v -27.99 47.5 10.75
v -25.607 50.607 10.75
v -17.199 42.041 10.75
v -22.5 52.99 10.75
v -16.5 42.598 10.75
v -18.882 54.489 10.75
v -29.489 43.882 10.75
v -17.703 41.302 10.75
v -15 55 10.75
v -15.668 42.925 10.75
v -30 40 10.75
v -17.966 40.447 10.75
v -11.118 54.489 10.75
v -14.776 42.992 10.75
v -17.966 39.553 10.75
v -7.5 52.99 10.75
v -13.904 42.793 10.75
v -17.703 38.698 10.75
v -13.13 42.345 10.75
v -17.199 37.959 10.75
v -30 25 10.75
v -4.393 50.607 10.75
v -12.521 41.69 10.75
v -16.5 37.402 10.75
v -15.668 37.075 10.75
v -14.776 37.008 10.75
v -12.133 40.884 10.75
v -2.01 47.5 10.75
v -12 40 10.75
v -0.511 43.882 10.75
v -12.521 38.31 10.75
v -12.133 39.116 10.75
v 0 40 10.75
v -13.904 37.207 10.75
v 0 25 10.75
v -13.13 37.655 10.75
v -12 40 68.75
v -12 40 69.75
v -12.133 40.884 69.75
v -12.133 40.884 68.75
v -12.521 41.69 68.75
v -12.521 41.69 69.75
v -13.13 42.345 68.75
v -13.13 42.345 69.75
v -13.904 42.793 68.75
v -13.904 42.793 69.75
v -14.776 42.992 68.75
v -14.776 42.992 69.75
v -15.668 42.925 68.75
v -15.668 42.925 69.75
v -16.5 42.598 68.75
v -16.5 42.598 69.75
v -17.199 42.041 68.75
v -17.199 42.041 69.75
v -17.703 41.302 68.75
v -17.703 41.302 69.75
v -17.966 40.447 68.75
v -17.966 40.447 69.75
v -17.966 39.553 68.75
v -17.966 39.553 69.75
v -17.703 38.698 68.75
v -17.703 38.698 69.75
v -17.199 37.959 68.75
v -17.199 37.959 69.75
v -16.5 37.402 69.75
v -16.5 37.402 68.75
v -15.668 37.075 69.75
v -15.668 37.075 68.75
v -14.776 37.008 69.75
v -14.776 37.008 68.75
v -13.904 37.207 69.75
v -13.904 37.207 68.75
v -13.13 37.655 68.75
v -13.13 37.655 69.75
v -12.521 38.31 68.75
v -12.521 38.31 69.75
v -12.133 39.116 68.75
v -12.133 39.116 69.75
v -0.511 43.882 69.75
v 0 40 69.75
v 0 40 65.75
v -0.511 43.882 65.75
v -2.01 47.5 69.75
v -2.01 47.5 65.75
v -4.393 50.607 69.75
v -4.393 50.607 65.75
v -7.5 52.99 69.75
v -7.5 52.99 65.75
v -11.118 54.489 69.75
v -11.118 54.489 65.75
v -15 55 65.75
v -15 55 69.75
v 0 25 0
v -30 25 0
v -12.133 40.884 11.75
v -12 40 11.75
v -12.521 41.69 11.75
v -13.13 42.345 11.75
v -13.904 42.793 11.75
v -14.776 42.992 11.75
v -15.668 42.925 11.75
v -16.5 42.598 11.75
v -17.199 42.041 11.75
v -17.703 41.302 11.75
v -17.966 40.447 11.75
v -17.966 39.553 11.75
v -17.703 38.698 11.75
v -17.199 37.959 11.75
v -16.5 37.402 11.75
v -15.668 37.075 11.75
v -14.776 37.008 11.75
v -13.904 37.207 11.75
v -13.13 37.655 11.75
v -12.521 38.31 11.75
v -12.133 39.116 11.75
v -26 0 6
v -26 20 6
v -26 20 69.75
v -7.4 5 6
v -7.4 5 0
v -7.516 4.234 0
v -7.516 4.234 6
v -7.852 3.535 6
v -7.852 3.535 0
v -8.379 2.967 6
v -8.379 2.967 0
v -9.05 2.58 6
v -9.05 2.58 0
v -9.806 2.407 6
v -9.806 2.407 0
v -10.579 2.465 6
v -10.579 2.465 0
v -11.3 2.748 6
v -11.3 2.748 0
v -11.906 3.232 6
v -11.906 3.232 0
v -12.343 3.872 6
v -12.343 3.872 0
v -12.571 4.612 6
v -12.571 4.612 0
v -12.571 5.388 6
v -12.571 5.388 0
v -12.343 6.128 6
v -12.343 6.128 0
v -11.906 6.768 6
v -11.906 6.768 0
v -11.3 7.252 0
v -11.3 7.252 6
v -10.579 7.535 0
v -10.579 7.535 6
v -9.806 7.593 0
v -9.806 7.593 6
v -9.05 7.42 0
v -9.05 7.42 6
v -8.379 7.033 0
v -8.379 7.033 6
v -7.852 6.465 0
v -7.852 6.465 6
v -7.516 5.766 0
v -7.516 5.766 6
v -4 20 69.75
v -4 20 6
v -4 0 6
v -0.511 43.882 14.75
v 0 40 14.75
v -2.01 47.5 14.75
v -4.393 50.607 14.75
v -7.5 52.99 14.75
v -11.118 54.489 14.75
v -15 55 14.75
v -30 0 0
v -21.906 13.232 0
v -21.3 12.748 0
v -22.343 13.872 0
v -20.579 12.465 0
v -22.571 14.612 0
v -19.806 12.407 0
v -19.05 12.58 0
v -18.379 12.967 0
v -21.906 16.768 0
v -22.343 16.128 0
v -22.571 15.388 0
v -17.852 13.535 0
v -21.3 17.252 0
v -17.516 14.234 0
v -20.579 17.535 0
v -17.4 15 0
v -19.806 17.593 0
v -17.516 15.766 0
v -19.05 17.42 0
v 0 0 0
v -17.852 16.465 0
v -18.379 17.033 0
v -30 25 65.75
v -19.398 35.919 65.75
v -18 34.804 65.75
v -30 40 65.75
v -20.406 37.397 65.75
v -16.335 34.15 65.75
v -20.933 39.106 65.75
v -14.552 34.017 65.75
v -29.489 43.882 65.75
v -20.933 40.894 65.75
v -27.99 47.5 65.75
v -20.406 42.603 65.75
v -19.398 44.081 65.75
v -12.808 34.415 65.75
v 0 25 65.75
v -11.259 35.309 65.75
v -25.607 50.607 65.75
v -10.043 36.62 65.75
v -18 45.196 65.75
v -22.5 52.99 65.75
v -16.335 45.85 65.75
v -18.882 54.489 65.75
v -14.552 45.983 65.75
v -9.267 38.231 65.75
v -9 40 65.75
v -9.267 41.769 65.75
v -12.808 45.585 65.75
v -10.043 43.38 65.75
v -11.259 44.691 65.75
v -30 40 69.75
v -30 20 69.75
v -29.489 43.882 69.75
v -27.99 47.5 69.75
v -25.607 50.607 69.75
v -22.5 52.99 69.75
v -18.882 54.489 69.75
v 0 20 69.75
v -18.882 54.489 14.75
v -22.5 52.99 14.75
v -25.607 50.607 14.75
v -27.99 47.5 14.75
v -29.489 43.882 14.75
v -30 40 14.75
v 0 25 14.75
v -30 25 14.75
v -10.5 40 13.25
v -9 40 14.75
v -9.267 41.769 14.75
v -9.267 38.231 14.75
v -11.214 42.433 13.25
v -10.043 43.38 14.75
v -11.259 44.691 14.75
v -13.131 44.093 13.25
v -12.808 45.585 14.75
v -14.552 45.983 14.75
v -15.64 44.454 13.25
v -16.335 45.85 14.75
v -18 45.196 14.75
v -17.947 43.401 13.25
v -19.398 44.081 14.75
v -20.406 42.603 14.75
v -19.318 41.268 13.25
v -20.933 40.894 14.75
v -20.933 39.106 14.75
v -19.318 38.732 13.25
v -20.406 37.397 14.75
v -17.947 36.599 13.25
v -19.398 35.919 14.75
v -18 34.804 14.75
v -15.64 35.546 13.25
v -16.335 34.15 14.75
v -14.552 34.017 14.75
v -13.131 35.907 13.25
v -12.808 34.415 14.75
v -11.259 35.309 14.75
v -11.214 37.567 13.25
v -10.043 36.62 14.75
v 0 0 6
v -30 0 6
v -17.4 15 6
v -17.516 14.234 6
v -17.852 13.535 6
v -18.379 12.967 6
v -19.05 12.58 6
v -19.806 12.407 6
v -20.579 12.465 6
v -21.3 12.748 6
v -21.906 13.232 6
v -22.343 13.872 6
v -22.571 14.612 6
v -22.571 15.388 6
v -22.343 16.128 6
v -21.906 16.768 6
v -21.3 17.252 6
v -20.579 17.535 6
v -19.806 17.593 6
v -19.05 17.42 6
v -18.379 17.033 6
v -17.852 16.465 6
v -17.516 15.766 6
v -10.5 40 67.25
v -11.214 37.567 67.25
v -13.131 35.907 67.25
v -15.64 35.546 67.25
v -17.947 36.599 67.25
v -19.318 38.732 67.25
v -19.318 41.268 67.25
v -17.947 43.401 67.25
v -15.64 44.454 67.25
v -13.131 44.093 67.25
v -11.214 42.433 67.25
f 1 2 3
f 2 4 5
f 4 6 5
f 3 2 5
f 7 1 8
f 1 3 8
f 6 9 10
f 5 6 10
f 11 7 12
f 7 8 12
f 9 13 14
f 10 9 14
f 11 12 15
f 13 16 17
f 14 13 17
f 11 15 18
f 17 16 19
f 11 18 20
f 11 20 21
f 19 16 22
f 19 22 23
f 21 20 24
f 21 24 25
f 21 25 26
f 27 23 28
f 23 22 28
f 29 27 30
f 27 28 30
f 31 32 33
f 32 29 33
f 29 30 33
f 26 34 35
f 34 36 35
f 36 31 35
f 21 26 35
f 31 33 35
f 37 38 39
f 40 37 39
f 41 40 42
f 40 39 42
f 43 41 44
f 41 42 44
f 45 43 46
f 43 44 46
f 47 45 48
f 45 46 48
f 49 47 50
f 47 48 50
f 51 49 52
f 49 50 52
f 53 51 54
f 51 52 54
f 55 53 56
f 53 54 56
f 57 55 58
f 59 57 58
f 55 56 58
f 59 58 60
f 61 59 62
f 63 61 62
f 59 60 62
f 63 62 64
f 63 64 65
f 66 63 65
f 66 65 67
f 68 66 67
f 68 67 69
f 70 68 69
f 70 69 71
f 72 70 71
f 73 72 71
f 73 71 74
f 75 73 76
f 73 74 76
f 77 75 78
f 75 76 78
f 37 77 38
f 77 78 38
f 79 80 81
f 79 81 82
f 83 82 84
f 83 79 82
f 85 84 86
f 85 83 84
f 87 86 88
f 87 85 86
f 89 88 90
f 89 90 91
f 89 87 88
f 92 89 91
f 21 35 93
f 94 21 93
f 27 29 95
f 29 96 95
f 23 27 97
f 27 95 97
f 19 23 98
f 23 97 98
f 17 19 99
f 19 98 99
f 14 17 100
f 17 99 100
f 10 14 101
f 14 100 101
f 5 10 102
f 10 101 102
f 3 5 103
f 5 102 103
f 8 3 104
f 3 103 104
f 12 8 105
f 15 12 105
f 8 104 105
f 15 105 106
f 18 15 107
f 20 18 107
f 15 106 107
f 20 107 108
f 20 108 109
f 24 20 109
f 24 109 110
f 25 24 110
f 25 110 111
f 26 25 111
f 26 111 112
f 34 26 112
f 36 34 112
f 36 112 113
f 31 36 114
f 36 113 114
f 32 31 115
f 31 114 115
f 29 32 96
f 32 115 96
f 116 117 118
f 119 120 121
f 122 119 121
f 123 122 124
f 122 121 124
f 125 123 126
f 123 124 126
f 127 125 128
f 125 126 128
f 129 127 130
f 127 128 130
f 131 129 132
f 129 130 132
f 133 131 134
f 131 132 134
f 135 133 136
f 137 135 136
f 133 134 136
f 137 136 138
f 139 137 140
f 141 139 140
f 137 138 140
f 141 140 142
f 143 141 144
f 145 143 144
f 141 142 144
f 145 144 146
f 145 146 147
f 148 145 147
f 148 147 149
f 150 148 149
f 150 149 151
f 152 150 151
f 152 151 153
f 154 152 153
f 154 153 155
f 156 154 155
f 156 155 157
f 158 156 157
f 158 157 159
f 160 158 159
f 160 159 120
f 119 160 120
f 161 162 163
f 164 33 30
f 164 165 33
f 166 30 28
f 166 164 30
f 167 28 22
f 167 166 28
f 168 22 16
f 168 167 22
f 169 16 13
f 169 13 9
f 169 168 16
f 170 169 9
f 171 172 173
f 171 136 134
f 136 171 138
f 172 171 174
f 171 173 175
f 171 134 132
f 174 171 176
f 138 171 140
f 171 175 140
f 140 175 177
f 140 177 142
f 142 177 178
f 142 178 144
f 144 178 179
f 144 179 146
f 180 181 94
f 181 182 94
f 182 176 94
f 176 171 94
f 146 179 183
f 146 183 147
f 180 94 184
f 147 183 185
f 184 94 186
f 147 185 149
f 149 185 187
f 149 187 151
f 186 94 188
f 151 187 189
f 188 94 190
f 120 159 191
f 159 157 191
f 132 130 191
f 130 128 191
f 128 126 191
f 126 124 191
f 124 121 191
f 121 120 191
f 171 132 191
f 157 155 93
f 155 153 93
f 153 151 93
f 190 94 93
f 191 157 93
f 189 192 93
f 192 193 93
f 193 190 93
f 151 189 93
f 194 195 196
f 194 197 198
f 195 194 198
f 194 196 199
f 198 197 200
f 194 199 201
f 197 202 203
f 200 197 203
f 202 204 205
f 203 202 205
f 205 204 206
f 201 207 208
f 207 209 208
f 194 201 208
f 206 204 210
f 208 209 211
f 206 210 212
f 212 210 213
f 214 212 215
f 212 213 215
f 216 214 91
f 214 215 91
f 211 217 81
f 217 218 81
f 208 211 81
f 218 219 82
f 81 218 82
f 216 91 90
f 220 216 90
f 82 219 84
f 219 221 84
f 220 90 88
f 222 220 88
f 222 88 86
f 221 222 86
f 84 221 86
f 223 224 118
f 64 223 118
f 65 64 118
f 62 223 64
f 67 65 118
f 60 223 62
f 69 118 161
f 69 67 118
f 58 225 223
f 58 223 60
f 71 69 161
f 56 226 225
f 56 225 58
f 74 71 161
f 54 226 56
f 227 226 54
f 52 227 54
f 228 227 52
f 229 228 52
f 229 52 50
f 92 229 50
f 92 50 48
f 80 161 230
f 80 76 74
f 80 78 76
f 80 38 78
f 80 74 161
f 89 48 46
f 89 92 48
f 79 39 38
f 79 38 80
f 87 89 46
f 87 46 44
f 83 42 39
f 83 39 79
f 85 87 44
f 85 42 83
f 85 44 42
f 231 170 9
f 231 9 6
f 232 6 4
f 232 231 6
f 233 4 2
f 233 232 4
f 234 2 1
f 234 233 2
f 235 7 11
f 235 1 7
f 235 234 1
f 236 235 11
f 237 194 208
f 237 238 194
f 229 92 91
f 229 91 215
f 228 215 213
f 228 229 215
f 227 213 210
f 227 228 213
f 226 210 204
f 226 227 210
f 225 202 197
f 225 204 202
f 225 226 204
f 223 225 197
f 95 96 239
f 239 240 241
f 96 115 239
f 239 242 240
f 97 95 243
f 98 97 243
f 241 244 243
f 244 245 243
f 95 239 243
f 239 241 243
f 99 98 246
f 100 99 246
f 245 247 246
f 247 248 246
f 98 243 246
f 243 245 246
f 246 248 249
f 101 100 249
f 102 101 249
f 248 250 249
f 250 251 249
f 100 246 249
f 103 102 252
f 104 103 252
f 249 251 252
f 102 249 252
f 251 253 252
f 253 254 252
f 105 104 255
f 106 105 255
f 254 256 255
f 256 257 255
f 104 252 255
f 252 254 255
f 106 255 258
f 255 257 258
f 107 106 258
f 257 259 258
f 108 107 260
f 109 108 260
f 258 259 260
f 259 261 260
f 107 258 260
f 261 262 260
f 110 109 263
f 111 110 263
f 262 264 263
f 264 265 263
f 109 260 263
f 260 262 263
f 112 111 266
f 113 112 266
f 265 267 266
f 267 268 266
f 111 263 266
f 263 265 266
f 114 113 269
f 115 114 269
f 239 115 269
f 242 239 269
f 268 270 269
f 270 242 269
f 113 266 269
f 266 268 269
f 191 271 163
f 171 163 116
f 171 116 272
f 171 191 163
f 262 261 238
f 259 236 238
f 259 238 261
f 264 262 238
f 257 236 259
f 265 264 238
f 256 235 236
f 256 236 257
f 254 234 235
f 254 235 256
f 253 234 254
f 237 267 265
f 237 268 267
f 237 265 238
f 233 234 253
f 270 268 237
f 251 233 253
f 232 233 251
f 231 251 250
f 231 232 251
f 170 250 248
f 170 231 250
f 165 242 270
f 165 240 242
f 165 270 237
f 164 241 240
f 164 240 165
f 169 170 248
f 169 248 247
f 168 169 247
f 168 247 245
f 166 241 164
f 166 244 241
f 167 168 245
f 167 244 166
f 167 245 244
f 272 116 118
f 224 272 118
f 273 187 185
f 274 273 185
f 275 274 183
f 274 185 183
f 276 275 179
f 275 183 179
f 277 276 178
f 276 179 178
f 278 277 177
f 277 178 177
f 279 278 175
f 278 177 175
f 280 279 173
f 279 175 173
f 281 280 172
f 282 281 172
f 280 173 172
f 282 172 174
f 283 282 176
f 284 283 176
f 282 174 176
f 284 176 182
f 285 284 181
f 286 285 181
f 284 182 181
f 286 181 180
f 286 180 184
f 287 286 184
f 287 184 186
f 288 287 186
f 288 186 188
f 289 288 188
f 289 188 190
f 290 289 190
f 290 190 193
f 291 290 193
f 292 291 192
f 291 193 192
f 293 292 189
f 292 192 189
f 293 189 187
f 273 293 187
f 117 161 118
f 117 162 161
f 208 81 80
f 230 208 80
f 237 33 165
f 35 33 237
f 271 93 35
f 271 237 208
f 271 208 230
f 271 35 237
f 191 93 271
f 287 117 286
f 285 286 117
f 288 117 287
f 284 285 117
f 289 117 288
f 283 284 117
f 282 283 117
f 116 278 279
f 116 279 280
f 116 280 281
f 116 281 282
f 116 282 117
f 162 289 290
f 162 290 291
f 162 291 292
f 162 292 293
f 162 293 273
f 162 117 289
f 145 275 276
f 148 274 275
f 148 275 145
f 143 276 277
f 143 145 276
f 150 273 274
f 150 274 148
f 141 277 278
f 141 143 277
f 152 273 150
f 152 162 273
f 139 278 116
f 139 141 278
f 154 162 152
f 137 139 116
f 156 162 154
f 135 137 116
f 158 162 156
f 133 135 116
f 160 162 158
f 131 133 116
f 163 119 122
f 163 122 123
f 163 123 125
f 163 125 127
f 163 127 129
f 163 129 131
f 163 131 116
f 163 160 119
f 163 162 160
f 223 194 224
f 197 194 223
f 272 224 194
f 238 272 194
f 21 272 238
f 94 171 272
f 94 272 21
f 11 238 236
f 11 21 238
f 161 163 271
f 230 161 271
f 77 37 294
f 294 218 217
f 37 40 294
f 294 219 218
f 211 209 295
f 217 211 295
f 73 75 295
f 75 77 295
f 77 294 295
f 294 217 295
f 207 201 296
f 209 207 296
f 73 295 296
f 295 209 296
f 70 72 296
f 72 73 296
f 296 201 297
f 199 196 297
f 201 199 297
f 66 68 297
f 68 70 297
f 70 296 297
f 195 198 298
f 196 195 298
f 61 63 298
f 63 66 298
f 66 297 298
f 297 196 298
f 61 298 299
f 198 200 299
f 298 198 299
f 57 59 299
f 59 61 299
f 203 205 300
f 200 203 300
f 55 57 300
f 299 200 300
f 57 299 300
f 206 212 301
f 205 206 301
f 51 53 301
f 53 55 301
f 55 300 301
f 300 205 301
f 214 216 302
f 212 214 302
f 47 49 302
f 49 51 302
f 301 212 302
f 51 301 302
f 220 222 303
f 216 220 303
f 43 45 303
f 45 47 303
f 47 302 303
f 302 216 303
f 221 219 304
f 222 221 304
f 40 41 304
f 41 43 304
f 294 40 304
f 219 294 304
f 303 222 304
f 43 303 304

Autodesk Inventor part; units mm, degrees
ref_plane "YZ Plane" through (0, 0, 0) normal (1, 0, 0) x (0, 1, 0)
ref_plane "XZ Plane" through (0, 0, 0) normal (0, 1, 0) x (-1, 0, 0)
ref_plane "XY Plane" through (0, 0, 0) normal (0, 0, 1) x (1, 0, 0)
sketch "Sketch1" plane through (0, 0, 0) normal (0, 0, 1) x (1, 0, 0)
  line L0 (0, 0) -> (-30, 0)
  line L1 (-30, 0) -> (-30, 20)
  line L2 (-30, 20) -> (0, 20)
  line L3 (0, 20) -> (0, 0)
  line L4 (0, 20) -> (-30, 20)
  line L5 (-30, 20) -> (-30, 55)
  line L6 (-30, 55) -> (0, 55)
  line L7 (0, 55) -> (0, 20)
  line L8 (-20, 15) -> (-10, 15) construction
  line L9 (-10, 15) -> (-10, 5) construction
  line L10 (-10, 5) -> (-20, 5) construction
  line L11 (-20, 5) -> (-20, 15) construction
  line L12 (-15, 15) -> (-15, 20) construction
  line L13 (-20, 10) -> (-30, 10) construction
  circle A0 centre (-20, 15) radius 2.6
  circle A1 centre (-10, 5) radius 2.6
  dimension "d0" = 30
  dimension "d1" = 20
  dimension "d2" = 30
  dimension "d3" = 35
  dimension "d4" = 10
  dimension "d5" = 10
  dimension "d6" = 5.2
  dimension "d8" = 5.2
extrude "Extrusion1" add sketch "Sketch1" along normal blind 14.75
sketch "Sketch2" plane through (0, 0, 14.75) normal (0, 0, 1) x (1, 0, 0)
  line L0 (0, 0) -> (0, 55) projected
  line L1 (0, 20) -> (-30, 20)
  line L2 (-30, 20) -> (-30, 25)
  line L3 (-30, 25) -> (0, 25)
  line L4 (0, 25) -> (0, 20)
  line L5 (-30, 0) -> (0, 0) projected
  line L6 (-30, 55) -> (-30, 0) projected
  point P0 (0, 25)
  dimension "d14" = 5
  dimension "d15" = 20
extrude "Extrusion2" add sketch "Sketch2" along normal blind 51 contours L1 L2 L3 L0
sketch "Sketch3" plane through (0, 0, 65.75) normal (0, 0, 1) x (1, 0, 0)
  line L0 (-30, 25) -> (0, 25) projected
  line L1 (0, 25) -> (0, 55) projected
  line L2 (0, 55) -> (-30, 55) projected
  line L3 (-30, 55) -> (-30, 25) projected
  line L4 (-30, 20) -> (0, 20) projected
  line L5 (0, 20) -> (0, 25) projected
  line L6 (0, 25) -> (-30, 25) projected
  line L7 (-30, 25) -> (-30, 20) projected
  line L8 (-30, 0) -> (0, 0) projected
  line L9 (0, 0) -> (0, 20) projected
  line L10 (0, 20) -> (-30, 20) projected
  line L11 (-30, 20) -> (-30, 0) projected
  point P0 (0, 25)
extrude "Extrusion3" add sketch "Sketch3" along normal blind 4 contours L3 L2 L1 L0 | L0 L5 L4 L7
sketch "Sketch4" plane through (0, 0, 0) normal (1, 0, 0) x (0, 0, -1)
  line L0 (-14.75, 55) -> (-14.75, 0) projected
  line L1 (-14.75, 20) -> (-6, 20)
  line L2 (-6, 20) -> (-6, 0)
  line L3 (-6, 0) -> (-14.75, 0)
  line L4 (-14.75, 0) -> (-14.75, 20)
  line L5 (0, 55) -> (-14.75, 55) projected
  line L6 (0, 55) -> (-10.75, 55)
  line L7 (-10.75, 55) -> (-10.75, 25)
  line L8 (-10.75, 25) -> (0, 25)
  line L9 (0, 25) -> (0, 55)
  line L10 (-14.75, 25) -> (-14.75, 55) projected
  line L11 (0, 0) -> (0, 55) projected
  point P0 (-14.75, 0)
  dimension "d21" = 20
  dimension "d22" = 30
  dimension "d23" = 4
  dimension "d50" = 6
extrude "Extrusion4" cut sketch "Sketch4" against normal through all
sketch "Sketch6" plane through (0, 0, 6) normal (0, 0, 1) x (1, 0, 0)
  line L0 (-30, 20) -> (0, 20) projected
  line L1 (-30, 0) -> (0, 0) projected
  line L2 (0, 20) -> (-4, 20)
  line L3 (-4, 20) -> (-4, 0)
  line L4 (-4, 0) -> (0, 0)
  line L5 (0, 0) -> (0, 20)
  line L6 (-30, 55) -> (-30, 20) projected
  line L7 (-30, 20) -> (-26, 20)
  line L8 (-26, 20) -> (-26, 0)
  line L9 (-26, 0) -> (-30, 0)
  line L10 (-30, 0) -> (-30, 20)
  point P0 (-26, 0)
  dimension "d33" = 4
  dimension "d34" = 4
extrude "Extrusion6" add sketch "Sketch6" along normal up to surface (63.75 mm away) contours L0 L8 L1 L10 | L0 L5 L1 L3
chamfer "Chamfer2" distance 63.75 distance2 20 1 edges at (-2, 0, 69.75) measured on face at (-1.3333, 0, 25.25)
chamfer "Chamfer3" distance 63.75 distance2 20 1 edges at (-28, 0, 69.75) measured on face at (-28.6667, 0, 25.25)
fillet "Fillet1" radius 15 4 edges at (-30, 55, 67.75) (0, 55, 67.75) (-30, 55, 12.75) (0, 55, 12.75)
sketch "Sketch7" plane through (0, 0, 69.75) normal (0, 0, 1) x (1, 0, 0)
  arc A0 (0, 40) -> (-30, 40) centre (-15, 40) ccw projected
  circle A1 centre (-15, 40) radius 3
  point P0 (0, 0)
  dimension "d44" = 6
extrude "Extrusion7" cut sketch "Sketch7" against normal through all
chamfer "Chamfer4" distance 3 angle 45 2 edges at (-18, 40, 14.75) (-18, 40, 65.75)
equation "\"d8\" = d6"
properties part number "X Axis Drag Chain Mount Moble"
